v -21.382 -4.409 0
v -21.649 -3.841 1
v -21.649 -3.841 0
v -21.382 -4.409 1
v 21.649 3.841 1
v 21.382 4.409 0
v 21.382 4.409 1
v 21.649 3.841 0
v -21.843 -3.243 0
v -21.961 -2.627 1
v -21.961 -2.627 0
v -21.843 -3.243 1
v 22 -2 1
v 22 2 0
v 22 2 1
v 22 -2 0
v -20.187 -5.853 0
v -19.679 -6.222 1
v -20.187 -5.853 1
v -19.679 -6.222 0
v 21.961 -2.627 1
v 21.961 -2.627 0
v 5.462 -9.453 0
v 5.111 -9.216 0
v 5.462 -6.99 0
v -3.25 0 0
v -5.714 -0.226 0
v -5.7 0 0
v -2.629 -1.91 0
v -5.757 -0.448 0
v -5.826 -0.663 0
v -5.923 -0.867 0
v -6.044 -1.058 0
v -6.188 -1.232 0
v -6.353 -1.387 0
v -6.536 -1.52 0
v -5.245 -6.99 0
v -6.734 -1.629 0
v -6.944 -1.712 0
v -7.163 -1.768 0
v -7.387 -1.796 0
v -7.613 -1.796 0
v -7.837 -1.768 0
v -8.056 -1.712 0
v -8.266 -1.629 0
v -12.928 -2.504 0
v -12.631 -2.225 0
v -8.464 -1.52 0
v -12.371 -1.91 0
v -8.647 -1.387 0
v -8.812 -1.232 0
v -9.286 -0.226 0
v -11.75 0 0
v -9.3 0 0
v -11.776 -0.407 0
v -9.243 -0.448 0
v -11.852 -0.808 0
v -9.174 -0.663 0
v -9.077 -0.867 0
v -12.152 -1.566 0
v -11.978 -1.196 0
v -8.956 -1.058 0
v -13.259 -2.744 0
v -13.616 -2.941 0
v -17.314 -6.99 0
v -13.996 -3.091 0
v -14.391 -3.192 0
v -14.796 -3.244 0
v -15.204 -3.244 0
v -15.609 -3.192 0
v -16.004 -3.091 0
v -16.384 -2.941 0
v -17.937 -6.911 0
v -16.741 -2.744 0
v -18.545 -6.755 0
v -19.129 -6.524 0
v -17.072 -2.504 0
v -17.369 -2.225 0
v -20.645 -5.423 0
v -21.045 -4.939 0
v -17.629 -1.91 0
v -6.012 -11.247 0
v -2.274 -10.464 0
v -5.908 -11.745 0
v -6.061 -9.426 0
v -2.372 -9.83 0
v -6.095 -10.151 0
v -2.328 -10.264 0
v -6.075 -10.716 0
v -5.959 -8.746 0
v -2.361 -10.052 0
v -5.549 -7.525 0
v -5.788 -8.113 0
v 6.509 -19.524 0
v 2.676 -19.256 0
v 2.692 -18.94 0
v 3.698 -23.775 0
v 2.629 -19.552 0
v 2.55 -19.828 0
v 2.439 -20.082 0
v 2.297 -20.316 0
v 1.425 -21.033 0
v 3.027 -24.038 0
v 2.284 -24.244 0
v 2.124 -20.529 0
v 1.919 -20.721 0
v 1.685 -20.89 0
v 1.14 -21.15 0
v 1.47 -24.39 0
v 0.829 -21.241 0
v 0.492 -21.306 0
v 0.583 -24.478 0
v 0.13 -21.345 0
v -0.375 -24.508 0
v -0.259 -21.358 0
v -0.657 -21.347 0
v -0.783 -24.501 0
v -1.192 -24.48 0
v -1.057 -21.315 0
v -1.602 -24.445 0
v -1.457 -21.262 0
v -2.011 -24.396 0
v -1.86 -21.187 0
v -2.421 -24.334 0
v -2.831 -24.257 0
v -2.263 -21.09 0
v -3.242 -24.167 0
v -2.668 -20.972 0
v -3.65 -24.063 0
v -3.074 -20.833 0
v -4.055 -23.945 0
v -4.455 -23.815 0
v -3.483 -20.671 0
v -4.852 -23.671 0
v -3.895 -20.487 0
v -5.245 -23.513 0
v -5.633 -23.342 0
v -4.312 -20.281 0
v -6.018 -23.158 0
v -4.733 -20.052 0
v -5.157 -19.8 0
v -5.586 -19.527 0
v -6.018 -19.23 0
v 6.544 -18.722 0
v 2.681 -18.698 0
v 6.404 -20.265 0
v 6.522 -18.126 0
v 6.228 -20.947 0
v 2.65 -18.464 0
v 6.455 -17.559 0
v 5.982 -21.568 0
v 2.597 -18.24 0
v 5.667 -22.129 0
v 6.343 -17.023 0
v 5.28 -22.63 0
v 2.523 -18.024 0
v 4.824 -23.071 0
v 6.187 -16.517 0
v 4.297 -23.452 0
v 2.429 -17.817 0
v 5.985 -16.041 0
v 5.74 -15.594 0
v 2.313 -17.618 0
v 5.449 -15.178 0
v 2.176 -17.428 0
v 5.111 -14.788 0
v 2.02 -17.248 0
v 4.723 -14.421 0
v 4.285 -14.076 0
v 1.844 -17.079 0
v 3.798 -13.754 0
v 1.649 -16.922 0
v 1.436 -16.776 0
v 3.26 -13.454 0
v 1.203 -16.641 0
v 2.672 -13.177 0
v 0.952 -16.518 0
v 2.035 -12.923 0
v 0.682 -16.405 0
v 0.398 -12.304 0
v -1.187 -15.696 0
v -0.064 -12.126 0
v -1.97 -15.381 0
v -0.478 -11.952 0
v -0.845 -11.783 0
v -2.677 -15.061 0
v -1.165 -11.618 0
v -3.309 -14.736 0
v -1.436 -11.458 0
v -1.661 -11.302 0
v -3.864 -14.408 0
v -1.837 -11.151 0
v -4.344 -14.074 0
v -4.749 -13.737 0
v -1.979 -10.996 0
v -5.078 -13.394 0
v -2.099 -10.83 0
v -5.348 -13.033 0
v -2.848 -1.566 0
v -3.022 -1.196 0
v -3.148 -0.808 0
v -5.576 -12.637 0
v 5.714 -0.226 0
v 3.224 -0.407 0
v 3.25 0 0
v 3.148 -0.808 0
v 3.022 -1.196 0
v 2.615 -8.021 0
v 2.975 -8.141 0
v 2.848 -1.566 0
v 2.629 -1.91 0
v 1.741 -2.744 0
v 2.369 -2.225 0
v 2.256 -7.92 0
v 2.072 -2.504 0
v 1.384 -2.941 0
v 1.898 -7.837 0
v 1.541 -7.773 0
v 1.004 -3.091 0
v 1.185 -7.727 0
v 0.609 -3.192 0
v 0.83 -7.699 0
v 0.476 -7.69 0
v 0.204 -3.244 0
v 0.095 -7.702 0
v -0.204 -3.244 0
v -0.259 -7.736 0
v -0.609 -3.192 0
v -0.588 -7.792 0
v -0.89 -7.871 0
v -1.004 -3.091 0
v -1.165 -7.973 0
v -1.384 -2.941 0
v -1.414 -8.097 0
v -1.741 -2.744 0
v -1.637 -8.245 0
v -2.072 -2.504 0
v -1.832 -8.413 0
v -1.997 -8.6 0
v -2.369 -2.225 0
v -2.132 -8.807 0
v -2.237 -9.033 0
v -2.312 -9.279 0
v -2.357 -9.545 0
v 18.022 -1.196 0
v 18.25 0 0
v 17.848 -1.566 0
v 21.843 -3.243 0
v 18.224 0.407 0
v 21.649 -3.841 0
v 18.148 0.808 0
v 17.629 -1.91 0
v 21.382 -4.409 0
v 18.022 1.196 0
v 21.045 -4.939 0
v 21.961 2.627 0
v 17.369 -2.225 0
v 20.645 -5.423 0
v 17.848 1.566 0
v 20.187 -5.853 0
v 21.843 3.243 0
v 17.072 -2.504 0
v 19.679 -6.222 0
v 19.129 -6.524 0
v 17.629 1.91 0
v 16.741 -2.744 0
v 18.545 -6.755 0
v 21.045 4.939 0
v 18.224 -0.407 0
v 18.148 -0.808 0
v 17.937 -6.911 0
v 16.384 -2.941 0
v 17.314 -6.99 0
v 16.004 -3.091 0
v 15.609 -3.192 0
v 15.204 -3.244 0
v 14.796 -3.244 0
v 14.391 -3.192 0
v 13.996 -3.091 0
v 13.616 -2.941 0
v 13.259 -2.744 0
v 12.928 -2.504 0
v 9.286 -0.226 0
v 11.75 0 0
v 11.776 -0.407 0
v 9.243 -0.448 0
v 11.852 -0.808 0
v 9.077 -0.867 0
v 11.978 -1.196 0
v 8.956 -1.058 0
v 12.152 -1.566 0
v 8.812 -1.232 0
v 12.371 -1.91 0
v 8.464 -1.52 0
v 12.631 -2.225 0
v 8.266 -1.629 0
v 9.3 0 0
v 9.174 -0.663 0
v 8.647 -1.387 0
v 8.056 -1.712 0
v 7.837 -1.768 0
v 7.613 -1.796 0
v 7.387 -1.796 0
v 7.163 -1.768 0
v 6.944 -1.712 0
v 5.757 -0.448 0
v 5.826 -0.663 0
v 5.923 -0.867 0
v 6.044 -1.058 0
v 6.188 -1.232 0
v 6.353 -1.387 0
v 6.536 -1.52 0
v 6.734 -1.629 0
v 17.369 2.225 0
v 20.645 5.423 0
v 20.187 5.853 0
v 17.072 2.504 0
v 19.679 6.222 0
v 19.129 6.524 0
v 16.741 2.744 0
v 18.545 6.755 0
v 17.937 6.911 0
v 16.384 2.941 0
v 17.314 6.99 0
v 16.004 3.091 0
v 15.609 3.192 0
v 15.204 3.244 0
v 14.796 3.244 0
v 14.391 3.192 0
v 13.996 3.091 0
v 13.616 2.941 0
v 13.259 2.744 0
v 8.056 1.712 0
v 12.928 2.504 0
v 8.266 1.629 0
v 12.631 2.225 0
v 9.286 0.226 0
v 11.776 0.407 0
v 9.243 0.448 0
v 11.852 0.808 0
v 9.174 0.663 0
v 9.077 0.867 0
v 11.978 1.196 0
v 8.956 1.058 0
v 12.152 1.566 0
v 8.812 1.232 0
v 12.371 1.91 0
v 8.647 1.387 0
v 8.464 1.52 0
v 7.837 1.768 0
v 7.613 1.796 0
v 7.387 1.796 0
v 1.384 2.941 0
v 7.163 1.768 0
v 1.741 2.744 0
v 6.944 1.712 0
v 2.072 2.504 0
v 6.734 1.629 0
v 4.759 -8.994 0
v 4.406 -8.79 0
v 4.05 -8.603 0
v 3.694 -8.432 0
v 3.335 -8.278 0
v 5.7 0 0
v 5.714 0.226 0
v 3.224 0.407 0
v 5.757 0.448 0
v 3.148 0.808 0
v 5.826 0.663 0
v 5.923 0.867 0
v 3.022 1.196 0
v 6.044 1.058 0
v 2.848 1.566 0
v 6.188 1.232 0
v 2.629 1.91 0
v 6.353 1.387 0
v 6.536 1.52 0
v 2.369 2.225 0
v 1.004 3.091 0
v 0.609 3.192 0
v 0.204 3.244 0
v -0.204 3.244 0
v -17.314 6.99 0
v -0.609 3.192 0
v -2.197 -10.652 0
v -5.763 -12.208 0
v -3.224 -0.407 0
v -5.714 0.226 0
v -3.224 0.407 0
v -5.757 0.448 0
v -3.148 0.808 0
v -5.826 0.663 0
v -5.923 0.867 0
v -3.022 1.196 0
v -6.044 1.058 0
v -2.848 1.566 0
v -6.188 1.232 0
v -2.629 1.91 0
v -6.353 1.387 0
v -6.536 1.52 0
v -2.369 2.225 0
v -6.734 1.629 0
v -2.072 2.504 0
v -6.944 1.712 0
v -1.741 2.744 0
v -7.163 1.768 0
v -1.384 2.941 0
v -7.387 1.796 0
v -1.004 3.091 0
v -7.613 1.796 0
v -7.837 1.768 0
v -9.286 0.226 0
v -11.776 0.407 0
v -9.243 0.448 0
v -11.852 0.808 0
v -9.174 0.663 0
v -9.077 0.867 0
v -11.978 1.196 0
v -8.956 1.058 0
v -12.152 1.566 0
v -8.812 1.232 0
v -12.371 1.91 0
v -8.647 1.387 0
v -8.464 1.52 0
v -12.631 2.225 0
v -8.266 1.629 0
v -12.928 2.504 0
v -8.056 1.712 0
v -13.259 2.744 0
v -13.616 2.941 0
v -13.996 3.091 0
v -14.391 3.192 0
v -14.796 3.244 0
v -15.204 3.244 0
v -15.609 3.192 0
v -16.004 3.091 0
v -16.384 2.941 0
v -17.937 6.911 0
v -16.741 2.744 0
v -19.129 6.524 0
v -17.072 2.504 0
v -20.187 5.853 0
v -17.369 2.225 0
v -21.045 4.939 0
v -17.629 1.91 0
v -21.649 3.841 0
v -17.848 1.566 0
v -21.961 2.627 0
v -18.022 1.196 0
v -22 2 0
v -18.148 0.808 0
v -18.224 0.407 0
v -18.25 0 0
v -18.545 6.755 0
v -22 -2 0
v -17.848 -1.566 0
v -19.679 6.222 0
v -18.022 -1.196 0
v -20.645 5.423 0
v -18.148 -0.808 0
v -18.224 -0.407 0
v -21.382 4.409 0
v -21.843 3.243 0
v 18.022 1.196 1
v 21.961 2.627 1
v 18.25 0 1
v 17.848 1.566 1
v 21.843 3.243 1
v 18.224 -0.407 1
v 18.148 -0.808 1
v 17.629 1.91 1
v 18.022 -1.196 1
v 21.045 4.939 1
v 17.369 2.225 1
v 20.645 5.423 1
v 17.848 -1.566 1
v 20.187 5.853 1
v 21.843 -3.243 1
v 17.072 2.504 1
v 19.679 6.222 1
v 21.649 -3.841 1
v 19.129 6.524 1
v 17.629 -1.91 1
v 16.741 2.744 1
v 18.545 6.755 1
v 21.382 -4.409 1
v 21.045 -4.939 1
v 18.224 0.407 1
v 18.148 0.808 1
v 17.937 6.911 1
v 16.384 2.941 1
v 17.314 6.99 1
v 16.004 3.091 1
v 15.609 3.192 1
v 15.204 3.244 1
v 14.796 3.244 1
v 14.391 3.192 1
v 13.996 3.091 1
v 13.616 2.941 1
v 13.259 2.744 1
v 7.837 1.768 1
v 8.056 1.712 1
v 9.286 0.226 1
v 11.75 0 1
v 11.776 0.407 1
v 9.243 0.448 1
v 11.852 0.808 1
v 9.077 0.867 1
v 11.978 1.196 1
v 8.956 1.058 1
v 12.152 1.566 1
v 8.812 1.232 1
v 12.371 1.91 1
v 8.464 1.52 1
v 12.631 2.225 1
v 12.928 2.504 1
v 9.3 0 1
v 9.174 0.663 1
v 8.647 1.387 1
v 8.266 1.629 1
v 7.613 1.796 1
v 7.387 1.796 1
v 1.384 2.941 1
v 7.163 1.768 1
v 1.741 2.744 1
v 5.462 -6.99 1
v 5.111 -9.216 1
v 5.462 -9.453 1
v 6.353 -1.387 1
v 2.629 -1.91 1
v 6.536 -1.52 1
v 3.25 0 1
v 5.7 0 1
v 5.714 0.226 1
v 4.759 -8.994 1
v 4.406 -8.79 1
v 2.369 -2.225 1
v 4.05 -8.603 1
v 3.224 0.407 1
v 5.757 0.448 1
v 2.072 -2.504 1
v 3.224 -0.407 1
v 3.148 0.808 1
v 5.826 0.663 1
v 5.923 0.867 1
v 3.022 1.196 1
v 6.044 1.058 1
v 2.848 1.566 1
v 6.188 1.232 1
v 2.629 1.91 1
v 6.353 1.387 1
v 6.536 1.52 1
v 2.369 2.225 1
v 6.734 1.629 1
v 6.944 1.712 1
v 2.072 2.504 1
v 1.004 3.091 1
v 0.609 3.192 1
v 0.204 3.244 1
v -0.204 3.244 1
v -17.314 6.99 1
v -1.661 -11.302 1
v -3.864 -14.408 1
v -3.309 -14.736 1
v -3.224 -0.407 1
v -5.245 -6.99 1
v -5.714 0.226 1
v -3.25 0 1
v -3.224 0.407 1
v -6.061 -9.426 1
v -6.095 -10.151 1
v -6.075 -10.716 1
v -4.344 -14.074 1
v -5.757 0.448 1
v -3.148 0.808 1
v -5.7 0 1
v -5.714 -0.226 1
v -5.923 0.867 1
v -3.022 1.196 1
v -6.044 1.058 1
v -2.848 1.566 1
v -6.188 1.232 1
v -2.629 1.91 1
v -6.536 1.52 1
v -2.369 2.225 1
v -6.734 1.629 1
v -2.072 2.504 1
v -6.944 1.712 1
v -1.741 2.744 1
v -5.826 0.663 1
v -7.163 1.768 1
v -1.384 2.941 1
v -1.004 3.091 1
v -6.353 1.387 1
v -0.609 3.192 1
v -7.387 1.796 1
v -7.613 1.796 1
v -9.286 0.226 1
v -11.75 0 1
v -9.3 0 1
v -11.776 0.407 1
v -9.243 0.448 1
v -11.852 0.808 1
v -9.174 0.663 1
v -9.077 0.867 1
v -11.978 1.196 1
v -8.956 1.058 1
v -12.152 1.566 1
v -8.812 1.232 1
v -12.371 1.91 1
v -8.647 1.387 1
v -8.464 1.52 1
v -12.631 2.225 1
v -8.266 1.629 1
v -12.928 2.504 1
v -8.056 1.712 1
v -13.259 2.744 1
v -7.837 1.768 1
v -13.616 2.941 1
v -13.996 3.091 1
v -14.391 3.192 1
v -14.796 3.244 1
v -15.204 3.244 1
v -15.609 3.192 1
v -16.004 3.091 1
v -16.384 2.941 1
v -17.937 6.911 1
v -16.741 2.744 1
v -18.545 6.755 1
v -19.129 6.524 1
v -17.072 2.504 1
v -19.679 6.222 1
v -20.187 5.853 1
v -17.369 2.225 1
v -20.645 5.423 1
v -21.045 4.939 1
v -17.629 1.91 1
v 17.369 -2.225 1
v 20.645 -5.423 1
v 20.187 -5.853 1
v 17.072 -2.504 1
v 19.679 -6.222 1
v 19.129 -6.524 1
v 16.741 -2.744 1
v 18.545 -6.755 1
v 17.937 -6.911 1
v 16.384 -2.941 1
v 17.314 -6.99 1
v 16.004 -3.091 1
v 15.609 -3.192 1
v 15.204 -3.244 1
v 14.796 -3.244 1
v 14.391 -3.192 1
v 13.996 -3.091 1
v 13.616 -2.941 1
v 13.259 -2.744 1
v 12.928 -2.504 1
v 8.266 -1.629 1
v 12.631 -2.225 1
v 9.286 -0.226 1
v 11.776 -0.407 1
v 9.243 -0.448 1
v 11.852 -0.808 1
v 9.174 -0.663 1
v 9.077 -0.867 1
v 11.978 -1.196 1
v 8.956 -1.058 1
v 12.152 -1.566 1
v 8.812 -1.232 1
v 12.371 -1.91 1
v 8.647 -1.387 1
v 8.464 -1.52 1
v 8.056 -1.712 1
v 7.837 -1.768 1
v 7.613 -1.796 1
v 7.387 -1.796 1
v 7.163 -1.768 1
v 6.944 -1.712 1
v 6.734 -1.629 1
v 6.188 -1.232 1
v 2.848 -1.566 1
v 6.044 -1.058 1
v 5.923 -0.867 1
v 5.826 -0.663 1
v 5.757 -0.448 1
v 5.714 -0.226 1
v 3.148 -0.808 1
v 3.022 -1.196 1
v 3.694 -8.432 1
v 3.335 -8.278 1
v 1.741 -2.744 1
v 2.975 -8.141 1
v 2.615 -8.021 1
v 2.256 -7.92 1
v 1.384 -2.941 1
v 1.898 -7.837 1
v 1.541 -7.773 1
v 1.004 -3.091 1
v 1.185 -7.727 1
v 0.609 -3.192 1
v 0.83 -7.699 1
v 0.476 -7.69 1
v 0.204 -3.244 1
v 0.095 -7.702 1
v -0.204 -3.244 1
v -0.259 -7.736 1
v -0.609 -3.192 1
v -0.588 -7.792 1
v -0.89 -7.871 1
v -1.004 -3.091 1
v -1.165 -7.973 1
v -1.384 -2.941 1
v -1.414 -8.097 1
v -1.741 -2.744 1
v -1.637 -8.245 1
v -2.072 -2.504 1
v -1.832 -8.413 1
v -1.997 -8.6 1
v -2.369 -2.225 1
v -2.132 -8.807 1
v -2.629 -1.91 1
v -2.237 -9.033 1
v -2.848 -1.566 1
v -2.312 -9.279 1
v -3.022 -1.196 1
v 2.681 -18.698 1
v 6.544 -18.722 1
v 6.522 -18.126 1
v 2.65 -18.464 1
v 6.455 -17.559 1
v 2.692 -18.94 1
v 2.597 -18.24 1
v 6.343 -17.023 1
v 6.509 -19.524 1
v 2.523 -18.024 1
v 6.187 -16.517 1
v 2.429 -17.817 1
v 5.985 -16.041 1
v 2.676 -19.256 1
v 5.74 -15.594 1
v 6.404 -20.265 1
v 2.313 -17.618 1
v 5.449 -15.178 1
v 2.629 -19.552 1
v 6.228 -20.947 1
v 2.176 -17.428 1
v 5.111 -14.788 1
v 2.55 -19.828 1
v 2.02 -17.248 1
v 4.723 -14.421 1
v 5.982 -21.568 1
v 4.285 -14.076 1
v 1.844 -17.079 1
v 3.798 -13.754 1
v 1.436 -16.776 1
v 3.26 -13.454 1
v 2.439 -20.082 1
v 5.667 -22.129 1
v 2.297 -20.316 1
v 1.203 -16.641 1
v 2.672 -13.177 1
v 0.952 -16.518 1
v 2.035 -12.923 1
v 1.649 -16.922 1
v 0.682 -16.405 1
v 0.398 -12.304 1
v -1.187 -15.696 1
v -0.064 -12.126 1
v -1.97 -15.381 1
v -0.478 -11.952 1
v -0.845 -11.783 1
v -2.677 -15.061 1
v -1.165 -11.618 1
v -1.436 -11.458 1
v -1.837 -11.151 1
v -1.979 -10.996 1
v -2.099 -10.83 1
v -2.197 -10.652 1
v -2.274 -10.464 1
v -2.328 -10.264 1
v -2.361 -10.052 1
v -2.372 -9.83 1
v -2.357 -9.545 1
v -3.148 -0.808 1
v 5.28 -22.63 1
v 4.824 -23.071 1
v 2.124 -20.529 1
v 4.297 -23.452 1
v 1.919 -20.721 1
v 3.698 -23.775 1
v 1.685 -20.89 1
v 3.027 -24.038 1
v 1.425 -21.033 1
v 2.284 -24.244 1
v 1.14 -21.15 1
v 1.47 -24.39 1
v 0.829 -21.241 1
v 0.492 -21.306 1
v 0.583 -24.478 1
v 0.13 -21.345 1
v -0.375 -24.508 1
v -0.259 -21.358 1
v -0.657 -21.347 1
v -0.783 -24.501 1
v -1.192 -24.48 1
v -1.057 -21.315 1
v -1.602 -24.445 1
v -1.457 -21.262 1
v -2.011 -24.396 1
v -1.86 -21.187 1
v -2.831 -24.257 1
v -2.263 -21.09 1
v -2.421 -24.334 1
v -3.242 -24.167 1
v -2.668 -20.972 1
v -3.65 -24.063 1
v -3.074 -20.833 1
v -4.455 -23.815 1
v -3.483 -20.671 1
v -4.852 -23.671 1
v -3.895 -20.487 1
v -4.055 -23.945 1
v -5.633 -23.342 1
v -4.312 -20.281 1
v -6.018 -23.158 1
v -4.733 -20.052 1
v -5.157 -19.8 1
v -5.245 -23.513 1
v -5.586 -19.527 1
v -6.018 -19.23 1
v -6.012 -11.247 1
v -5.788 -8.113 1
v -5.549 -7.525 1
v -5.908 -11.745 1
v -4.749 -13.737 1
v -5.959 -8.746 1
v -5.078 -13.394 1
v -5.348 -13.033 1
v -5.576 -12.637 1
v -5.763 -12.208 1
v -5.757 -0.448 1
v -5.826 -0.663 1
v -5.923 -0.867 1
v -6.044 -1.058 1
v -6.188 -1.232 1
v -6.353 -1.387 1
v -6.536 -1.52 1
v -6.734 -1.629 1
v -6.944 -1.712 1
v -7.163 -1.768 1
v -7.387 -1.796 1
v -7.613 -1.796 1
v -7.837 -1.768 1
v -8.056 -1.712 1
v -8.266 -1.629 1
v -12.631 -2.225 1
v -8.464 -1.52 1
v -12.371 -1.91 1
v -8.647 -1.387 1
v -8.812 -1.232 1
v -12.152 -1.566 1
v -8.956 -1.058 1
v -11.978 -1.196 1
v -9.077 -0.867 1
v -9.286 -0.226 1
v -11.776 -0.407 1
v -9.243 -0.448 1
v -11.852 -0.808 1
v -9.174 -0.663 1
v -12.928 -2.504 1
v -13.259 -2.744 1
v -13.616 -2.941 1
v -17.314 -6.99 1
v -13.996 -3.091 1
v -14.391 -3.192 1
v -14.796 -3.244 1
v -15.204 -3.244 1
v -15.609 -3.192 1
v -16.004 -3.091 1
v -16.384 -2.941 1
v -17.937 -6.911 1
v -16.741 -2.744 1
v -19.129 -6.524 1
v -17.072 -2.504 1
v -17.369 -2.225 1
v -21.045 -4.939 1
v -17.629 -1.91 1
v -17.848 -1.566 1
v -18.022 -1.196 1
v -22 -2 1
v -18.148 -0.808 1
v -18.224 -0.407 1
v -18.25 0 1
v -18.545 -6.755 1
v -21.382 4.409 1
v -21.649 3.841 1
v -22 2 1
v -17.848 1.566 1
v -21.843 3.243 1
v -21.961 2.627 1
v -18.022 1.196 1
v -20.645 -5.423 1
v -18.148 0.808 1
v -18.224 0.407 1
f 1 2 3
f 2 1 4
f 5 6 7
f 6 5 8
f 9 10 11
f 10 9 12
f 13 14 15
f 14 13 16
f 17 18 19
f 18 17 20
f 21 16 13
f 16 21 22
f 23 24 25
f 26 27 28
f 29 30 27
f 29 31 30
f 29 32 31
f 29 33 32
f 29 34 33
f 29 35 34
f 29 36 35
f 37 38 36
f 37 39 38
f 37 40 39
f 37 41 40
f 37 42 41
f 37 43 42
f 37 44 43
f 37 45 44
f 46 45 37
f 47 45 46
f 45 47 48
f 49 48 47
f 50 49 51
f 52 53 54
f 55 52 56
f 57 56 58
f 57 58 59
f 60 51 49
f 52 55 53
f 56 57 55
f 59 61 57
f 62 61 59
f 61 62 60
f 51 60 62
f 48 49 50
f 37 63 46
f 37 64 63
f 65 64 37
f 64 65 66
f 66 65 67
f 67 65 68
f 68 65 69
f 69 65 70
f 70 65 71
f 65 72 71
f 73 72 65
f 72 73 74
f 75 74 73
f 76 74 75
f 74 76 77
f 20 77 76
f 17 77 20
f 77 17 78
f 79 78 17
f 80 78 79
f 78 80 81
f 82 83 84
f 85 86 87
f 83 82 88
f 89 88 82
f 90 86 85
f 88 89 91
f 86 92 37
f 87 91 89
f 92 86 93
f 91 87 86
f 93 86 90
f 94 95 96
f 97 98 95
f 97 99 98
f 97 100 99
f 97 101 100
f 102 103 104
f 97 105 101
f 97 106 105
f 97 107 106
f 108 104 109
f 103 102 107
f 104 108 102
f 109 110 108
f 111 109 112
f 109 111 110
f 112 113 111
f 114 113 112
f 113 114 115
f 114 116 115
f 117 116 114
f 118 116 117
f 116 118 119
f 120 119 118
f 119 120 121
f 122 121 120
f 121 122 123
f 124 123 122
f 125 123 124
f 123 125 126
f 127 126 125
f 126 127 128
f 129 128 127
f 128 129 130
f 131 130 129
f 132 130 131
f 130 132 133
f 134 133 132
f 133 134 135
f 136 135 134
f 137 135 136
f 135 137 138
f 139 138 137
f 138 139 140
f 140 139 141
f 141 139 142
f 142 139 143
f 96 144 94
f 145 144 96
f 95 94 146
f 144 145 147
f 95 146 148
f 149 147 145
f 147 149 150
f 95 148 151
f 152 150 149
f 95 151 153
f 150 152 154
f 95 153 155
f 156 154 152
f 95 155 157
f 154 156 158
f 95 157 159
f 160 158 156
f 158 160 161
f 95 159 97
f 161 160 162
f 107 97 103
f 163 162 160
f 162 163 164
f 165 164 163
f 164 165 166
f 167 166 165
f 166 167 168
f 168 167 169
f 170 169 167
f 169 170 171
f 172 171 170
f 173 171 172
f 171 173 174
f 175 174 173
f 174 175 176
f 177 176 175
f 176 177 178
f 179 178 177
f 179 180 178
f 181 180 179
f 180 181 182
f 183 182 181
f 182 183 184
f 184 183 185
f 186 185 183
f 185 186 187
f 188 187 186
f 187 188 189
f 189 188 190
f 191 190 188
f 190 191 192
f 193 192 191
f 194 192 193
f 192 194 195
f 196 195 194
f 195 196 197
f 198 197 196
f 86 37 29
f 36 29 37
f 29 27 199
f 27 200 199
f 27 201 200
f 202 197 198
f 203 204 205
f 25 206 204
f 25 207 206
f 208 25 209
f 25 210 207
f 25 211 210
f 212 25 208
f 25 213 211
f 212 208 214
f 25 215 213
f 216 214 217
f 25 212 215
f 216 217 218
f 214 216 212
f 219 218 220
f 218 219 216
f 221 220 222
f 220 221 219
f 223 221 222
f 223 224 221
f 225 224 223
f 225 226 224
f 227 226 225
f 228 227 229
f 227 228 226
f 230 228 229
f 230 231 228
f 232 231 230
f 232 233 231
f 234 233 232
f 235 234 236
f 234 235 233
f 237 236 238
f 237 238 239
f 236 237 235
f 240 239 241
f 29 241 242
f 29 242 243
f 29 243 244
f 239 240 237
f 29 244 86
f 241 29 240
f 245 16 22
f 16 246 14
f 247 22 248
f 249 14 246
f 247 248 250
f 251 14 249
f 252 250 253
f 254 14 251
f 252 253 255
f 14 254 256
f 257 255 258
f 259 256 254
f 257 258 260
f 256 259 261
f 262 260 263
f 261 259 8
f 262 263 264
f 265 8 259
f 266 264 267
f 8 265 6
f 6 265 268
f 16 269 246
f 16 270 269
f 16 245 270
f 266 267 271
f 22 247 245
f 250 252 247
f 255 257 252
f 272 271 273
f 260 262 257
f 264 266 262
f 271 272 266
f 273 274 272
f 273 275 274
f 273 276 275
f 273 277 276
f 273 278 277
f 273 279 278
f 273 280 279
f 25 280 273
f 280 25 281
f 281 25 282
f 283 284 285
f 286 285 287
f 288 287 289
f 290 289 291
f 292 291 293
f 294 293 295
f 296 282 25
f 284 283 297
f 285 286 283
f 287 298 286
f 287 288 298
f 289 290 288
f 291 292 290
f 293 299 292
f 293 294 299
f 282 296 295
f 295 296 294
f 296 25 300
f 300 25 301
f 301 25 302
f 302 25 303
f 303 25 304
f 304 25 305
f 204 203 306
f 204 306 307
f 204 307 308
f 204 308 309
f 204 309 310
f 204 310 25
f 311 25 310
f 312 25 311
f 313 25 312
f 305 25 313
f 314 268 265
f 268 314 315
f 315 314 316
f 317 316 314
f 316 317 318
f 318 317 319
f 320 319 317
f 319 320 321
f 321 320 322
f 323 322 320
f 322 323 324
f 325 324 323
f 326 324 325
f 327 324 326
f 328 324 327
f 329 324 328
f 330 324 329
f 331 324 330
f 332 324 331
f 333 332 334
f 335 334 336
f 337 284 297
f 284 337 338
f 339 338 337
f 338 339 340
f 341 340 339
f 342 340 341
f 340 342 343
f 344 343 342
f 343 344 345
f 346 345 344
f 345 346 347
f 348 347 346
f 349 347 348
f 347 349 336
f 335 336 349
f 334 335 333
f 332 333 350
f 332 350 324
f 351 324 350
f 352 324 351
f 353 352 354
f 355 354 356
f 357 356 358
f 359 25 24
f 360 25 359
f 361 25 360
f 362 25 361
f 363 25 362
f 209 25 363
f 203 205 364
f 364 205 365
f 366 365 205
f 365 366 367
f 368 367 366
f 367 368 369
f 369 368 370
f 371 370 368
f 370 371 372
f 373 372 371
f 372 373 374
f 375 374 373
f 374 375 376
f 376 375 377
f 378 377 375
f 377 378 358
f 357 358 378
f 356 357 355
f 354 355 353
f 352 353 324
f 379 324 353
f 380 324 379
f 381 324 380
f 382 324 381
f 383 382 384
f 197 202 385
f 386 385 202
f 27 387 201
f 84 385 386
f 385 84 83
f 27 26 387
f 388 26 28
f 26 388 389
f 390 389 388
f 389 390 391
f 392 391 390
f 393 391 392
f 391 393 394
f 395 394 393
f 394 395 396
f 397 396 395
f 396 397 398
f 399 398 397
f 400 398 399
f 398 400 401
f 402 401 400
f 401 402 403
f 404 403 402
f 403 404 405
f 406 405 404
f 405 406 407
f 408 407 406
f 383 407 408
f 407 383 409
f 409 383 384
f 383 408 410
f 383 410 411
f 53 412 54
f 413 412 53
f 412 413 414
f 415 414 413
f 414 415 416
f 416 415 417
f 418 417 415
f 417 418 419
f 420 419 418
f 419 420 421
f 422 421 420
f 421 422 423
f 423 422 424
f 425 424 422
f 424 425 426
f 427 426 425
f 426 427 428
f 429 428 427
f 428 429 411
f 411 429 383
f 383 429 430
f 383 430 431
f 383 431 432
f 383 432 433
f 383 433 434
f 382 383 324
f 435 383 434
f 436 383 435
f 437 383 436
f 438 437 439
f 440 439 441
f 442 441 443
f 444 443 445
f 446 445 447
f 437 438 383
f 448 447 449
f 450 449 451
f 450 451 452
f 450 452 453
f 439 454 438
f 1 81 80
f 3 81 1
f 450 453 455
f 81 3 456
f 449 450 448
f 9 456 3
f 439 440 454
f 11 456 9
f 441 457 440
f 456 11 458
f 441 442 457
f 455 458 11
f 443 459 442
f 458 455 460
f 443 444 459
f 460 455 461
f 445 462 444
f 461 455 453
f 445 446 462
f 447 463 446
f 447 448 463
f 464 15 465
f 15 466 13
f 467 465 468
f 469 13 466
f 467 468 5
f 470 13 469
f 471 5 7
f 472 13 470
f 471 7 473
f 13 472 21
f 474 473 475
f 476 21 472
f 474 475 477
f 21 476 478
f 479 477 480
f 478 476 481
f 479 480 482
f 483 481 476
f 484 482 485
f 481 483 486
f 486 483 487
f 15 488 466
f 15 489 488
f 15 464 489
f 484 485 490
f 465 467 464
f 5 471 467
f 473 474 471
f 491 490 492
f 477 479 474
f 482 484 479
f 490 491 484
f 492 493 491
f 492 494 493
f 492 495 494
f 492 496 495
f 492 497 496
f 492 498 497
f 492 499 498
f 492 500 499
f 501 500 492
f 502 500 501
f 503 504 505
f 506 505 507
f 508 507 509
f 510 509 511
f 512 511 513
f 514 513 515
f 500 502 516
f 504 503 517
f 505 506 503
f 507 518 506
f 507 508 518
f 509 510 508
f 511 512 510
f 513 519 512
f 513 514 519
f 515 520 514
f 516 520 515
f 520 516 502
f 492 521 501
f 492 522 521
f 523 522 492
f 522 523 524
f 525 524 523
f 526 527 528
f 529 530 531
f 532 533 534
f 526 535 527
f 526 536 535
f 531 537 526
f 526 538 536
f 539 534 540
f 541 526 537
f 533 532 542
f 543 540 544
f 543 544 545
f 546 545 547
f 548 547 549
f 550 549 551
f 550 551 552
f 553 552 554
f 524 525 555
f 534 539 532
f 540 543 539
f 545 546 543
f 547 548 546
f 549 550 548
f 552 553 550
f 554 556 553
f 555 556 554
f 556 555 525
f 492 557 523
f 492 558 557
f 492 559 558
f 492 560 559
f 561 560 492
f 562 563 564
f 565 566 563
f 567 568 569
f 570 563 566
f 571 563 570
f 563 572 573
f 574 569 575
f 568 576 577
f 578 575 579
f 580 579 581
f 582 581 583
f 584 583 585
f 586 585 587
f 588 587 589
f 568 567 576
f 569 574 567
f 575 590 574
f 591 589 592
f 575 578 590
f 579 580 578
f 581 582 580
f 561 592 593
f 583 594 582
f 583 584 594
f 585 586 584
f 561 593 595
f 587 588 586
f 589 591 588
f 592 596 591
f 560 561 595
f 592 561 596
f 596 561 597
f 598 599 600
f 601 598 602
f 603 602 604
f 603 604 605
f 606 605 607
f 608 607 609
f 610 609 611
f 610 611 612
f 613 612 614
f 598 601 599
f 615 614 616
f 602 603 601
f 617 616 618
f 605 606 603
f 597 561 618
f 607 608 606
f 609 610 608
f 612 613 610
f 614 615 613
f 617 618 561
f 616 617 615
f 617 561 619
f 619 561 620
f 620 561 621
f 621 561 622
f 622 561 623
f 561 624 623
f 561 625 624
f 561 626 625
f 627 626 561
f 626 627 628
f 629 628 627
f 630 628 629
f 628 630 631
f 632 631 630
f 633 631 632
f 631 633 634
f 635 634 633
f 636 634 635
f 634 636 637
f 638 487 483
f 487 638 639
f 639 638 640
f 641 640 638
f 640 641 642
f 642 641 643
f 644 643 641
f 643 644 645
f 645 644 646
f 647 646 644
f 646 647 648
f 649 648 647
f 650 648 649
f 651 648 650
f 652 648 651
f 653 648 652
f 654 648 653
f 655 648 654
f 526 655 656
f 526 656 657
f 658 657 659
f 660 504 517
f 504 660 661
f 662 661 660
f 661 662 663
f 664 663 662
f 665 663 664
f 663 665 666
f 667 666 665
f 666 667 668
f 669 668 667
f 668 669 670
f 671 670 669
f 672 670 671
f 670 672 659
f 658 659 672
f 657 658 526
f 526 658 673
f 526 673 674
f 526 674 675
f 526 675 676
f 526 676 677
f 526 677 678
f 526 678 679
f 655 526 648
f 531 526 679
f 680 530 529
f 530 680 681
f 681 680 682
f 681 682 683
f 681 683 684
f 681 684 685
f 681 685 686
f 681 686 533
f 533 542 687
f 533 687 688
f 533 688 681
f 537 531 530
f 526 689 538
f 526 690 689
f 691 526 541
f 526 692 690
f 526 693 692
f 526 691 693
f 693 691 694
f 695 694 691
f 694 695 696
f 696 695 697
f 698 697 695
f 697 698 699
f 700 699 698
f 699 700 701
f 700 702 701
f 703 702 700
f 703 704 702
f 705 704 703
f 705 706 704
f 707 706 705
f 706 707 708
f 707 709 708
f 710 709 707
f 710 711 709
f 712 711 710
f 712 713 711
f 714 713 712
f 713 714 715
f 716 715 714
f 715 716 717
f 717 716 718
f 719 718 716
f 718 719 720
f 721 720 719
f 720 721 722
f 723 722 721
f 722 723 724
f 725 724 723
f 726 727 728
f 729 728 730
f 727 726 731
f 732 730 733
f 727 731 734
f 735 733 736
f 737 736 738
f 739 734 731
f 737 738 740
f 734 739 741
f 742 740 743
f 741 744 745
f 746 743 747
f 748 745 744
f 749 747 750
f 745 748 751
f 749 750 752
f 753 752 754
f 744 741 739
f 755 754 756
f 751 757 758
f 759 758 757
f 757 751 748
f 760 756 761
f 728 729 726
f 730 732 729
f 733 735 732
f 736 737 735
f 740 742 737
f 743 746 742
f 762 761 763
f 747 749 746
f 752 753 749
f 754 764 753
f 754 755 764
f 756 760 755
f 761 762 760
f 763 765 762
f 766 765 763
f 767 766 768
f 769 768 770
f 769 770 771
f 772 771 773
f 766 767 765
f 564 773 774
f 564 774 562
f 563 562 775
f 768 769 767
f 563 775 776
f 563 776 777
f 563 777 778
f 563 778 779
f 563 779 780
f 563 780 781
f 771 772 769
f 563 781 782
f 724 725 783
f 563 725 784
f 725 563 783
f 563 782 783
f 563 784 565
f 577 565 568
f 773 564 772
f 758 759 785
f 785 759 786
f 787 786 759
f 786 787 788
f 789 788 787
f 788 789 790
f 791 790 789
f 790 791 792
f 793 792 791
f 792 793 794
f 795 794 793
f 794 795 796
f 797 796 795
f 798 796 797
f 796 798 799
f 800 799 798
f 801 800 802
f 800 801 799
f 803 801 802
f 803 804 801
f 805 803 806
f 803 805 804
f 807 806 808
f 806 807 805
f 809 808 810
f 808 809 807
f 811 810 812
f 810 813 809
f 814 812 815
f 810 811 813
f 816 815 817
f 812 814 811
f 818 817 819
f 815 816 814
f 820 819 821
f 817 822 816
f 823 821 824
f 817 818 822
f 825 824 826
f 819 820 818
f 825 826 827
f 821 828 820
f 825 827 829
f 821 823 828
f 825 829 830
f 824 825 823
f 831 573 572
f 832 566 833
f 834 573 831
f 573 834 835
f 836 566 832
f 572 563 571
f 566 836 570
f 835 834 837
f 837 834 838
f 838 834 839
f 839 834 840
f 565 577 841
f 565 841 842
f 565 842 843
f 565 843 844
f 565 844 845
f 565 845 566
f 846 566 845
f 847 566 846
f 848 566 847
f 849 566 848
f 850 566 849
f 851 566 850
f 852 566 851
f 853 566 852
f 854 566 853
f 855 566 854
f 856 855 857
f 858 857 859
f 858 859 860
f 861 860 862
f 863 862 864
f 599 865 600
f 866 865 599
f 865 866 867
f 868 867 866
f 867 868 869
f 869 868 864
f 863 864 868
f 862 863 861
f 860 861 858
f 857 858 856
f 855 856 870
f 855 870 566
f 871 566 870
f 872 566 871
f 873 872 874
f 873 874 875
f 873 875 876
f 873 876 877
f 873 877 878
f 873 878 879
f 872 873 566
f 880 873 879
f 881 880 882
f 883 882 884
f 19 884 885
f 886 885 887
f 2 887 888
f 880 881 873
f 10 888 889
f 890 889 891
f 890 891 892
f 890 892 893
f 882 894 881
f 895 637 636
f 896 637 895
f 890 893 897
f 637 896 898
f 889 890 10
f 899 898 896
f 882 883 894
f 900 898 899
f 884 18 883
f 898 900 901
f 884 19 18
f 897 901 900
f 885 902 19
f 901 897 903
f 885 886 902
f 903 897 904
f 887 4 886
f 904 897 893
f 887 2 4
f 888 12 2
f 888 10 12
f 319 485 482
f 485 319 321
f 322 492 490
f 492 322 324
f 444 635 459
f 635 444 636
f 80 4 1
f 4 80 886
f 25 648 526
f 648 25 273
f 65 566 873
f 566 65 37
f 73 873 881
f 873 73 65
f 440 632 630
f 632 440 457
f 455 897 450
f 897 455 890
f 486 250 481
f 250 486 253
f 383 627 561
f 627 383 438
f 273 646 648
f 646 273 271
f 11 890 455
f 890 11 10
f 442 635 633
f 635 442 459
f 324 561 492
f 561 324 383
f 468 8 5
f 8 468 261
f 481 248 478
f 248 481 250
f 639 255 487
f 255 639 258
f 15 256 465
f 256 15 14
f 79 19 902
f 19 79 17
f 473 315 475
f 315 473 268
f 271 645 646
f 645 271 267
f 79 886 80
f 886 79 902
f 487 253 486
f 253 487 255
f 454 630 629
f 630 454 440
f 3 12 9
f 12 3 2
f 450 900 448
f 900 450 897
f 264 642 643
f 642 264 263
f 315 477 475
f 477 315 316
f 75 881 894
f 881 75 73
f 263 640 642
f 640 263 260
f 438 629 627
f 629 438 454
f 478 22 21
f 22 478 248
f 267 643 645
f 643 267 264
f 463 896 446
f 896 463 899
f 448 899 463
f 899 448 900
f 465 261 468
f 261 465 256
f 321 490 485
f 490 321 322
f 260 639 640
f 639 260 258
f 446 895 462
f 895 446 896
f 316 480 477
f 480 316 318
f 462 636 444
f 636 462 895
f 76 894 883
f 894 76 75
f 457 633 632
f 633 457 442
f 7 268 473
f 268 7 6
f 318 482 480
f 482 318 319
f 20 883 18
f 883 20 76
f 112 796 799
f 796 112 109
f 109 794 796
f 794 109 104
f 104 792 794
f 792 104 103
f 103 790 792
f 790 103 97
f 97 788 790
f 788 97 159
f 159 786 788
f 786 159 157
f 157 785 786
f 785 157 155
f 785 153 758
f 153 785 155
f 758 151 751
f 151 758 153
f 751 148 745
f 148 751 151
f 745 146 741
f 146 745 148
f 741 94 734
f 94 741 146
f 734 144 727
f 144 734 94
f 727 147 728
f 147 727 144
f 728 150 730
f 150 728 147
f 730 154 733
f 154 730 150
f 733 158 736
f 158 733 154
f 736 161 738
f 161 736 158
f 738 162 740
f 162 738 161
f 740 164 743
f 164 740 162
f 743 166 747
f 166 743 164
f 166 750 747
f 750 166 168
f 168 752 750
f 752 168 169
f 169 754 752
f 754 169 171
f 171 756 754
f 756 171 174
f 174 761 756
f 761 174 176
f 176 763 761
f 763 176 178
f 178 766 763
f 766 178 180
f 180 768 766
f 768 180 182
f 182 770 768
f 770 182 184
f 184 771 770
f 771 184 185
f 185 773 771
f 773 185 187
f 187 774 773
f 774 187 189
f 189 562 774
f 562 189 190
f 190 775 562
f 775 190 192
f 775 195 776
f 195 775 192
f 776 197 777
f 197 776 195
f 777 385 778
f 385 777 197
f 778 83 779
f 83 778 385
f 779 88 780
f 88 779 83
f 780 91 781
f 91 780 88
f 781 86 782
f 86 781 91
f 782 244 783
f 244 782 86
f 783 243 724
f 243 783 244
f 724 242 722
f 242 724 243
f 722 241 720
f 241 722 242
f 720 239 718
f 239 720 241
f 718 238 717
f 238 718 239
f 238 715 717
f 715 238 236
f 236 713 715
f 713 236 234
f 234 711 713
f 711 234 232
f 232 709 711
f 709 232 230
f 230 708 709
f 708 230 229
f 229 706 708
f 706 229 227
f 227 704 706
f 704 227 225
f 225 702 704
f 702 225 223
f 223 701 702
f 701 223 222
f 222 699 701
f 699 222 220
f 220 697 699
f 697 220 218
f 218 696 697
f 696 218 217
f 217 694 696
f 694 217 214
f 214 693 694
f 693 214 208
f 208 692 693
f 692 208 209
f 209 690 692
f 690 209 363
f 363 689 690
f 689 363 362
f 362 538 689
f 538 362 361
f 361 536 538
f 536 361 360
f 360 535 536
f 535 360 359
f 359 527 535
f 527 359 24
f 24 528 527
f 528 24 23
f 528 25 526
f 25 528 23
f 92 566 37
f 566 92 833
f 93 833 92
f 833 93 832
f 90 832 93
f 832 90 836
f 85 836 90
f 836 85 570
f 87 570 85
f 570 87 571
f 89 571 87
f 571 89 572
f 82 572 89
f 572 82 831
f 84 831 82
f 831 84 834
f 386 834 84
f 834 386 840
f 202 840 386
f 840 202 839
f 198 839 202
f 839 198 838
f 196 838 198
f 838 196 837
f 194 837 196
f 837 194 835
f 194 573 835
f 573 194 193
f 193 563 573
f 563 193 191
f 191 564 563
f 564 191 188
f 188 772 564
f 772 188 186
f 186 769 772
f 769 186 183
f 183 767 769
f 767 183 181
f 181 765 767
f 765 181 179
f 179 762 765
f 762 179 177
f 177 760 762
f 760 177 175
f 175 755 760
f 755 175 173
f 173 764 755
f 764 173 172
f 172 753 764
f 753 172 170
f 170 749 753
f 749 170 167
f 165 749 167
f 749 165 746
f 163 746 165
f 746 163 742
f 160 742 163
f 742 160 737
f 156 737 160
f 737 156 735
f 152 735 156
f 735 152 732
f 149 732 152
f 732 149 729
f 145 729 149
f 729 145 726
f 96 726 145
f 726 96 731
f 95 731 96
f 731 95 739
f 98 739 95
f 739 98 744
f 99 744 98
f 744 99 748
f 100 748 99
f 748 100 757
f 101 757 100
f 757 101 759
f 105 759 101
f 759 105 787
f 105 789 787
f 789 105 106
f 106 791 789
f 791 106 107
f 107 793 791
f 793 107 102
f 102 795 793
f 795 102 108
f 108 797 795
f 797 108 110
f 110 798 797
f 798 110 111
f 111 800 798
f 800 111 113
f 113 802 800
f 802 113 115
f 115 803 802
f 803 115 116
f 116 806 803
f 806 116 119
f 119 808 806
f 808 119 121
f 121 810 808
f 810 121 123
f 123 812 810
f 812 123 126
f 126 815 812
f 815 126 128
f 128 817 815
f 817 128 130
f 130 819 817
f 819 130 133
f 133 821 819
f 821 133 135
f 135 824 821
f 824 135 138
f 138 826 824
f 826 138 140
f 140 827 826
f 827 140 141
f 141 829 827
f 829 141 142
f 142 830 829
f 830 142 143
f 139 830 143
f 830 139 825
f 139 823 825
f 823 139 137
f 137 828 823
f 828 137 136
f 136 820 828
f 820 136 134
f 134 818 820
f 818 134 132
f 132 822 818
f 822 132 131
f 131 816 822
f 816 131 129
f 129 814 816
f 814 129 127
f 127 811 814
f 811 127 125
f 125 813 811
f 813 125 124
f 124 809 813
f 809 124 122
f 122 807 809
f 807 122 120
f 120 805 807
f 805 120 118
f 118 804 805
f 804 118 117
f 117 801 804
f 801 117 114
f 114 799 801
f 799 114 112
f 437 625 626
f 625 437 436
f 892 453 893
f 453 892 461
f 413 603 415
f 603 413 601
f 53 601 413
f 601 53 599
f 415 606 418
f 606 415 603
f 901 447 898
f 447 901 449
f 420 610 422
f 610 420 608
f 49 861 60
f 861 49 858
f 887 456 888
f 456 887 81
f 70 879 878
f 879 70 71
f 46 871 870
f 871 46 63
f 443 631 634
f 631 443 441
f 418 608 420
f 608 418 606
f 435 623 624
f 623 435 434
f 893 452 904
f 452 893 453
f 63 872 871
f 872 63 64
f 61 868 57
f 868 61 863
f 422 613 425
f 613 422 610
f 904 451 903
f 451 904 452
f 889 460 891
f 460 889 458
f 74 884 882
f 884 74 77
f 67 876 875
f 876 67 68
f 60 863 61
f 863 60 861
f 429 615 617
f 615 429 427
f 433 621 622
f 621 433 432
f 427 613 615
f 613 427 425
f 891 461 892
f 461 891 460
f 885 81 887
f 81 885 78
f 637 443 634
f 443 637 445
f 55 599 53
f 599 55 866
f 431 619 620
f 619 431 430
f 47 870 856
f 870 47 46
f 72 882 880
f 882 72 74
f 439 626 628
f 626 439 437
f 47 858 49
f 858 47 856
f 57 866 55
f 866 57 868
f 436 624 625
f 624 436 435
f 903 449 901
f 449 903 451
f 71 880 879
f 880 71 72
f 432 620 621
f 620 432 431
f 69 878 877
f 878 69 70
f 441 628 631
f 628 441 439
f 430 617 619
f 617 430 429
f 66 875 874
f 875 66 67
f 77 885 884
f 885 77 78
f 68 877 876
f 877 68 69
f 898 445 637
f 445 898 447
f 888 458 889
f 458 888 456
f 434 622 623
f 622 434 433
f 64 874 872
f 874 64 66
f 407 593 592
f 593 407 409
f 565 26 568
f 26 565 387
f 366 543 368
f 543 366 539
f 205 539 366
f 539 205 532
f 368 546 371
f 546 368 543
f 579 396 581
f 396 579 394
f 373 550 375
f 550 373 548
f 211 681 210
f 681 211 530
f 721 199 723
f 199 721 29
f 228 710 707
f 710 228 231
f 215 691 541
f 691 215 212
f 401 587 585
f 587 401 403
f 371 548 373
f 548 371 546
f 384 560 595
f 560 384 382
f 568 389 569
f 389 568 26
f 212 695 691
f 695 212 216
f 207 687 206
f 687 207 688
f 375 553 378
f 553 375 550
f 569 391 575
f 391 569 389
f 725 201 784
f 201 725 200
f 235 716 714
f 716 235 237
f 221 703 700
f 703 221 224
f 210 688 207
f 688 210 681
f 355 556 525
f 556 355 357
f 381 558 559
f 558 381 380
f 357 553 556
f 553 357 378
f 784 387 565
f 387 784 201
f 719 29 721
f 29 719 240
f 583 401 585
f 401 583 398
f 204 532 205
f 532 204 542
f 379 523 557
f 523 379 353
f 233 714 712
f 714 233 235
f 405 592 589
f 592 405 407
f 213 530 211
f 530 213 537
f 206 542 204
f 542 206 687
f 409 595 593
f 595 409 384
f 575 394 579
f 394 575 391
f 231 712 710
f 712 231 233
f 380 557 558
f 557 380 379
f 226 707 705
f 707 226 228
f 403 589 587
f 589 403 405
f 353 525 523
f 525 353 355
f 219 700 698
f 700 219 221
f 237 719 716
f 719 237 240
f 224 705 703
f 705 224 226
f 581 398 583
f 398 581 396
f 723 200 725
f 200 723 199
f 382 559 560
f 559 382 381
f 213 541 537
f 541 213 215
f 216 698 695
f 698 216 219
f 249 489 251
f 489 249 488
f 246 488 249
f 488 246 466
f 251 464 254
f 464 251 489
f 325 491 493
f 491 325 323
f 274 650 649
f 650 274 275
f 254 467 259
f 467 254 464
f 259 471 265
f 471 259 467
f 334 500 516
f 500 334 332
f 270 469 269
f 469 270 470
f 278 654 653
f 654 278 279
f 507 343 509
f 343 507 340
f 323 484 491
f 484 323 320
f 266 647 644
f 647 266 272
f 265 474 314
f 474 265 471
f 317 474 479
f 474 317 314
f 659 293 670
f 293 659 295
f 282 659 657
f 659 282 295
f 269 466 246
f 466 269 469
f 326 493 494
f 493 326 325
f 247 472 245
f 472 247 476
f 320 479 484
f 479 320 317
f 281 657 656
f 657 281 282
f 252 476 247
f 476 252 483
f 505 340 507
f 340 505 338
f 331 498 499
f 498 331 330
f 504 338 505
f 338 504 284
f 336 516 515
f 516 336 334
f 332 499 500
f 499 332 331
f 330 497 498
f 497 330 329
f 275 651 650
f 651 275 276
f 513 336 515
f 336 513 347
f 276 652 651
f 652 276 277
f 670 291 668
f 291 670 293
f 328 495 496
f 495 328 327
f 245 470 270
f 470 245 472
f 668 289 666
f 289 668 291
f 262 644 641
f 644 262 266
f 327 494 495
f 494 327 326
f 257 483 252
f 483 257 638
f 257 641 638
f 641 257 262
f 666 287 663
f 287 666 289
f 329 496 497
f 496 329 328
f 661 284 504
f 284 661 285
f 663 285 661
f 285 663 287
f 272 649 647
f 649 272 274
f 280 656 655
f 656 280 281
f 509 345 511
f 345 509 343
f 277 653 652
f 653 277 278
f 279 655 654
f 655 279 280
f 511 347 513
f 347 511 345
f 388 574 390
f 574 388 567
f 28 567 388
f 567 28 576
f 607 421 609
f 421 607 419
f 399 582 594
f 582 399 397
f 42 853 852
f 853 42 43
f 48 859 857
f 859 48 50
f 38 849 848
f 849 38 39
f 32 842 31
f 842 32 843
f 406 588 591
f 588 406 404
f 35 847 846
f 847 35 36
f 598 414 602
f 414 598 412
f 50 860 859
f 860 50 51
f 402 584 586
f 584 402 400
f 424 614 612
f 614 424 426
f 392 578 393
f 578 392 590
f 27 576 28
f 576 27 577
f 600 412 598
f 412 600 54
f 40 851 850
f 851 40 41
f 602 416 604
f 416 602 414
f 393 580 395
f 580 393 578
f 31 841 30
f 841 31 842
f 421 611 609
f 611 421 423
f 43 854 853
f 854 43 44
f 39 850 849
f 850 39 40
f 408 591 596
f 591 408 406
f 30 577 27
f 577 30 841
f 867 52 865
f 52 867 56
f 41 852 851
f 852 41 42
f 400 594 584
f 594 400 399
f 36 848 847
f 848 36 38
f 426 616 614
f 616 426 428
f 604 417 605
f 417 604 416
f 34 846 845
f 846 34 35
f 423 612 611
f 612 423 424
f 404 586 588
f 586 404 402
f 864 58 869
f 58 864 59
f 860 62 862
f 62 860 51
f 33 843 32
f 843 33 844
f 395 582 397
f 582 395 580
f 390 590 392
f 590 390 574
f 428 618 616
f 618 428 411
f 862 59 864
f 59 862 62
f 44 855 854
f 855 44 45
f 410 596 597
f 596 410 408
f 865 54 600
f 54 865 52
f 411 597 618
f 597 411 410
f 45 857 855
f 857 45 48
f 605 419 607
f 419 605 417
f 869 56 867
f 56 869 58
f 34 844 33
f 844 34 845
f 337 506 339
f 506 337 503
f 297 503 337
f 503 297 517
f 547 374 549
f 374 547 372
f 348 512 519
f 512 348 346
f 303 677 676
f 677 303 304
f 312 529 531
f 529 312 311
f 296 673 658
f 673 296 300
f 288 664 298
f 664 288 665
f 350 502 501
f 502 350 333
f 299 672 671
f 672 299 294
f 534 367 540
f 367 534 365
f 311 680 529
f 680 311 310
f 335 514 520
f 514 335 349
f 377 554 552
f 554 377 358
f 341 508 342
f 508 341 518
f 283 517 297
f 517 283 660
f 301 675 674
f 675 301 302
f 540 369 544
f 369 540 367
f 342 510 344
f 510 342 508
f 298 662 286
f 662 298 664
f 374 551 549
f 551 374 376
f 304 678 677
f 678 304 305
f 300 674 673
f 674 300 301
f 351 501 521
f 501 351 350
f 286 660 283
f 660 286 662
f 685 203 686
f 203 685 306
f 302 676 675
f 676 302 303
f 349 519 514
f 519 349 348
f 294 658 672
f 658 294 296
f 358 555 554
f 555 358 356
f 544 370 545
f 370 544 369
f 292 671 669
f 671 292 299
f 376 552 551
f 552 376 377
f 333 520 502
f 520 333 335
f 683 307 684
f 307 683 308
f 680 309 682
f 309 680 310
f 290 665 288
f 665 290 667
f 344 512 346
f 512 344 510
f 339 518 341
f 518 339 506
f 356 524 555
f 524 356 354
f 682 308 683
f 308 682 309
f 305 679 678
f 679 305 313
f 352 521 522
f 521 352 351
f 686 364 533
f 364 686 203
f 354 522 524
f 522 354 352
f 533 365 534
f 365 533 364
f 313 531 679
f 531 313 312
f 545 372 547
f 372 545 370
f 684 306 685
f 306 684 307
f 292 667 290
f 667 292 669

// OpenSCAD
$fn = 50;


difference() {
	union() {
		hull() {
			translate(v = [-17.0000000000, 2.0000000000, 0]) {
				cylinder(h = 1, r = 5);
			}
			translate(v = [17.0000000000, 2.0000000000, 0]) {
				cylinder(h = 1, r = 5);
			}
			translate(v = [-17.0000000000, -2.0000000000, 0]) {
				cylinder(h = 1, r = 5);
			}
			translate(v = [17.0000000000, -2.0000000000, 0]) {
				cylinder(h = 1, r = 5);
			}
		}
		translate(v = [0, -5, 0]) {
			linear_extrude(height = 1) {
				text(font = "DejaVu Sans Mono:style=Bold", halign = "center", size = 19.0000000000, text = "S", valign = "top");
			}
		}
	}
	union() {
		translate(v = [-15.0000000000, 0.0000000000, 0]) {
			translate(v = [0, 0, -100]) {
				cylinder(h = 200, r = 3.2500000000);
			}
		}
		translate(v = [0, 0, -100]) {
			cylinder(h = 200, r = 3.2500000000);
		}
		translate(v = [15.0000000000, 0.0000000000, 0]) {
			translate(v = [0, 0, -100]) {
				cylinder(h = 200, r = 3.2500000000);
			}
		}
		translate(v = [-15.0000000000, 0.0000000000, 0]) {
			translate(v = [0, 0, -100]) {
				cylinder(h = 200, r = 1.8000000000);
			}
		}
		translate(v = [-7.5000000000, 0.0000000000, 0]) {
			translate(v = [0, 0, -100]) {
				cylinder(h = 200, r = 1.8000000000);
			}
		}
		translate(v = [0, 0, -100]) {
			cylinder(h = 200, r = 1.8000000000);
		}
		translate(v = [7.5000000000, 0.0000000000, 0]) {
			translate(v = [0, 0, -100]) {
				cylinder(h = 200, r = 1.8000000000);
			}
		}
		translate(v = [15.0000000000, 0.0000000000, 0]) {
			translate(v = [0, 0, -100]) {
				cylinder(h = 200, r = 1.8000000000);
			}
		}
	}
}
